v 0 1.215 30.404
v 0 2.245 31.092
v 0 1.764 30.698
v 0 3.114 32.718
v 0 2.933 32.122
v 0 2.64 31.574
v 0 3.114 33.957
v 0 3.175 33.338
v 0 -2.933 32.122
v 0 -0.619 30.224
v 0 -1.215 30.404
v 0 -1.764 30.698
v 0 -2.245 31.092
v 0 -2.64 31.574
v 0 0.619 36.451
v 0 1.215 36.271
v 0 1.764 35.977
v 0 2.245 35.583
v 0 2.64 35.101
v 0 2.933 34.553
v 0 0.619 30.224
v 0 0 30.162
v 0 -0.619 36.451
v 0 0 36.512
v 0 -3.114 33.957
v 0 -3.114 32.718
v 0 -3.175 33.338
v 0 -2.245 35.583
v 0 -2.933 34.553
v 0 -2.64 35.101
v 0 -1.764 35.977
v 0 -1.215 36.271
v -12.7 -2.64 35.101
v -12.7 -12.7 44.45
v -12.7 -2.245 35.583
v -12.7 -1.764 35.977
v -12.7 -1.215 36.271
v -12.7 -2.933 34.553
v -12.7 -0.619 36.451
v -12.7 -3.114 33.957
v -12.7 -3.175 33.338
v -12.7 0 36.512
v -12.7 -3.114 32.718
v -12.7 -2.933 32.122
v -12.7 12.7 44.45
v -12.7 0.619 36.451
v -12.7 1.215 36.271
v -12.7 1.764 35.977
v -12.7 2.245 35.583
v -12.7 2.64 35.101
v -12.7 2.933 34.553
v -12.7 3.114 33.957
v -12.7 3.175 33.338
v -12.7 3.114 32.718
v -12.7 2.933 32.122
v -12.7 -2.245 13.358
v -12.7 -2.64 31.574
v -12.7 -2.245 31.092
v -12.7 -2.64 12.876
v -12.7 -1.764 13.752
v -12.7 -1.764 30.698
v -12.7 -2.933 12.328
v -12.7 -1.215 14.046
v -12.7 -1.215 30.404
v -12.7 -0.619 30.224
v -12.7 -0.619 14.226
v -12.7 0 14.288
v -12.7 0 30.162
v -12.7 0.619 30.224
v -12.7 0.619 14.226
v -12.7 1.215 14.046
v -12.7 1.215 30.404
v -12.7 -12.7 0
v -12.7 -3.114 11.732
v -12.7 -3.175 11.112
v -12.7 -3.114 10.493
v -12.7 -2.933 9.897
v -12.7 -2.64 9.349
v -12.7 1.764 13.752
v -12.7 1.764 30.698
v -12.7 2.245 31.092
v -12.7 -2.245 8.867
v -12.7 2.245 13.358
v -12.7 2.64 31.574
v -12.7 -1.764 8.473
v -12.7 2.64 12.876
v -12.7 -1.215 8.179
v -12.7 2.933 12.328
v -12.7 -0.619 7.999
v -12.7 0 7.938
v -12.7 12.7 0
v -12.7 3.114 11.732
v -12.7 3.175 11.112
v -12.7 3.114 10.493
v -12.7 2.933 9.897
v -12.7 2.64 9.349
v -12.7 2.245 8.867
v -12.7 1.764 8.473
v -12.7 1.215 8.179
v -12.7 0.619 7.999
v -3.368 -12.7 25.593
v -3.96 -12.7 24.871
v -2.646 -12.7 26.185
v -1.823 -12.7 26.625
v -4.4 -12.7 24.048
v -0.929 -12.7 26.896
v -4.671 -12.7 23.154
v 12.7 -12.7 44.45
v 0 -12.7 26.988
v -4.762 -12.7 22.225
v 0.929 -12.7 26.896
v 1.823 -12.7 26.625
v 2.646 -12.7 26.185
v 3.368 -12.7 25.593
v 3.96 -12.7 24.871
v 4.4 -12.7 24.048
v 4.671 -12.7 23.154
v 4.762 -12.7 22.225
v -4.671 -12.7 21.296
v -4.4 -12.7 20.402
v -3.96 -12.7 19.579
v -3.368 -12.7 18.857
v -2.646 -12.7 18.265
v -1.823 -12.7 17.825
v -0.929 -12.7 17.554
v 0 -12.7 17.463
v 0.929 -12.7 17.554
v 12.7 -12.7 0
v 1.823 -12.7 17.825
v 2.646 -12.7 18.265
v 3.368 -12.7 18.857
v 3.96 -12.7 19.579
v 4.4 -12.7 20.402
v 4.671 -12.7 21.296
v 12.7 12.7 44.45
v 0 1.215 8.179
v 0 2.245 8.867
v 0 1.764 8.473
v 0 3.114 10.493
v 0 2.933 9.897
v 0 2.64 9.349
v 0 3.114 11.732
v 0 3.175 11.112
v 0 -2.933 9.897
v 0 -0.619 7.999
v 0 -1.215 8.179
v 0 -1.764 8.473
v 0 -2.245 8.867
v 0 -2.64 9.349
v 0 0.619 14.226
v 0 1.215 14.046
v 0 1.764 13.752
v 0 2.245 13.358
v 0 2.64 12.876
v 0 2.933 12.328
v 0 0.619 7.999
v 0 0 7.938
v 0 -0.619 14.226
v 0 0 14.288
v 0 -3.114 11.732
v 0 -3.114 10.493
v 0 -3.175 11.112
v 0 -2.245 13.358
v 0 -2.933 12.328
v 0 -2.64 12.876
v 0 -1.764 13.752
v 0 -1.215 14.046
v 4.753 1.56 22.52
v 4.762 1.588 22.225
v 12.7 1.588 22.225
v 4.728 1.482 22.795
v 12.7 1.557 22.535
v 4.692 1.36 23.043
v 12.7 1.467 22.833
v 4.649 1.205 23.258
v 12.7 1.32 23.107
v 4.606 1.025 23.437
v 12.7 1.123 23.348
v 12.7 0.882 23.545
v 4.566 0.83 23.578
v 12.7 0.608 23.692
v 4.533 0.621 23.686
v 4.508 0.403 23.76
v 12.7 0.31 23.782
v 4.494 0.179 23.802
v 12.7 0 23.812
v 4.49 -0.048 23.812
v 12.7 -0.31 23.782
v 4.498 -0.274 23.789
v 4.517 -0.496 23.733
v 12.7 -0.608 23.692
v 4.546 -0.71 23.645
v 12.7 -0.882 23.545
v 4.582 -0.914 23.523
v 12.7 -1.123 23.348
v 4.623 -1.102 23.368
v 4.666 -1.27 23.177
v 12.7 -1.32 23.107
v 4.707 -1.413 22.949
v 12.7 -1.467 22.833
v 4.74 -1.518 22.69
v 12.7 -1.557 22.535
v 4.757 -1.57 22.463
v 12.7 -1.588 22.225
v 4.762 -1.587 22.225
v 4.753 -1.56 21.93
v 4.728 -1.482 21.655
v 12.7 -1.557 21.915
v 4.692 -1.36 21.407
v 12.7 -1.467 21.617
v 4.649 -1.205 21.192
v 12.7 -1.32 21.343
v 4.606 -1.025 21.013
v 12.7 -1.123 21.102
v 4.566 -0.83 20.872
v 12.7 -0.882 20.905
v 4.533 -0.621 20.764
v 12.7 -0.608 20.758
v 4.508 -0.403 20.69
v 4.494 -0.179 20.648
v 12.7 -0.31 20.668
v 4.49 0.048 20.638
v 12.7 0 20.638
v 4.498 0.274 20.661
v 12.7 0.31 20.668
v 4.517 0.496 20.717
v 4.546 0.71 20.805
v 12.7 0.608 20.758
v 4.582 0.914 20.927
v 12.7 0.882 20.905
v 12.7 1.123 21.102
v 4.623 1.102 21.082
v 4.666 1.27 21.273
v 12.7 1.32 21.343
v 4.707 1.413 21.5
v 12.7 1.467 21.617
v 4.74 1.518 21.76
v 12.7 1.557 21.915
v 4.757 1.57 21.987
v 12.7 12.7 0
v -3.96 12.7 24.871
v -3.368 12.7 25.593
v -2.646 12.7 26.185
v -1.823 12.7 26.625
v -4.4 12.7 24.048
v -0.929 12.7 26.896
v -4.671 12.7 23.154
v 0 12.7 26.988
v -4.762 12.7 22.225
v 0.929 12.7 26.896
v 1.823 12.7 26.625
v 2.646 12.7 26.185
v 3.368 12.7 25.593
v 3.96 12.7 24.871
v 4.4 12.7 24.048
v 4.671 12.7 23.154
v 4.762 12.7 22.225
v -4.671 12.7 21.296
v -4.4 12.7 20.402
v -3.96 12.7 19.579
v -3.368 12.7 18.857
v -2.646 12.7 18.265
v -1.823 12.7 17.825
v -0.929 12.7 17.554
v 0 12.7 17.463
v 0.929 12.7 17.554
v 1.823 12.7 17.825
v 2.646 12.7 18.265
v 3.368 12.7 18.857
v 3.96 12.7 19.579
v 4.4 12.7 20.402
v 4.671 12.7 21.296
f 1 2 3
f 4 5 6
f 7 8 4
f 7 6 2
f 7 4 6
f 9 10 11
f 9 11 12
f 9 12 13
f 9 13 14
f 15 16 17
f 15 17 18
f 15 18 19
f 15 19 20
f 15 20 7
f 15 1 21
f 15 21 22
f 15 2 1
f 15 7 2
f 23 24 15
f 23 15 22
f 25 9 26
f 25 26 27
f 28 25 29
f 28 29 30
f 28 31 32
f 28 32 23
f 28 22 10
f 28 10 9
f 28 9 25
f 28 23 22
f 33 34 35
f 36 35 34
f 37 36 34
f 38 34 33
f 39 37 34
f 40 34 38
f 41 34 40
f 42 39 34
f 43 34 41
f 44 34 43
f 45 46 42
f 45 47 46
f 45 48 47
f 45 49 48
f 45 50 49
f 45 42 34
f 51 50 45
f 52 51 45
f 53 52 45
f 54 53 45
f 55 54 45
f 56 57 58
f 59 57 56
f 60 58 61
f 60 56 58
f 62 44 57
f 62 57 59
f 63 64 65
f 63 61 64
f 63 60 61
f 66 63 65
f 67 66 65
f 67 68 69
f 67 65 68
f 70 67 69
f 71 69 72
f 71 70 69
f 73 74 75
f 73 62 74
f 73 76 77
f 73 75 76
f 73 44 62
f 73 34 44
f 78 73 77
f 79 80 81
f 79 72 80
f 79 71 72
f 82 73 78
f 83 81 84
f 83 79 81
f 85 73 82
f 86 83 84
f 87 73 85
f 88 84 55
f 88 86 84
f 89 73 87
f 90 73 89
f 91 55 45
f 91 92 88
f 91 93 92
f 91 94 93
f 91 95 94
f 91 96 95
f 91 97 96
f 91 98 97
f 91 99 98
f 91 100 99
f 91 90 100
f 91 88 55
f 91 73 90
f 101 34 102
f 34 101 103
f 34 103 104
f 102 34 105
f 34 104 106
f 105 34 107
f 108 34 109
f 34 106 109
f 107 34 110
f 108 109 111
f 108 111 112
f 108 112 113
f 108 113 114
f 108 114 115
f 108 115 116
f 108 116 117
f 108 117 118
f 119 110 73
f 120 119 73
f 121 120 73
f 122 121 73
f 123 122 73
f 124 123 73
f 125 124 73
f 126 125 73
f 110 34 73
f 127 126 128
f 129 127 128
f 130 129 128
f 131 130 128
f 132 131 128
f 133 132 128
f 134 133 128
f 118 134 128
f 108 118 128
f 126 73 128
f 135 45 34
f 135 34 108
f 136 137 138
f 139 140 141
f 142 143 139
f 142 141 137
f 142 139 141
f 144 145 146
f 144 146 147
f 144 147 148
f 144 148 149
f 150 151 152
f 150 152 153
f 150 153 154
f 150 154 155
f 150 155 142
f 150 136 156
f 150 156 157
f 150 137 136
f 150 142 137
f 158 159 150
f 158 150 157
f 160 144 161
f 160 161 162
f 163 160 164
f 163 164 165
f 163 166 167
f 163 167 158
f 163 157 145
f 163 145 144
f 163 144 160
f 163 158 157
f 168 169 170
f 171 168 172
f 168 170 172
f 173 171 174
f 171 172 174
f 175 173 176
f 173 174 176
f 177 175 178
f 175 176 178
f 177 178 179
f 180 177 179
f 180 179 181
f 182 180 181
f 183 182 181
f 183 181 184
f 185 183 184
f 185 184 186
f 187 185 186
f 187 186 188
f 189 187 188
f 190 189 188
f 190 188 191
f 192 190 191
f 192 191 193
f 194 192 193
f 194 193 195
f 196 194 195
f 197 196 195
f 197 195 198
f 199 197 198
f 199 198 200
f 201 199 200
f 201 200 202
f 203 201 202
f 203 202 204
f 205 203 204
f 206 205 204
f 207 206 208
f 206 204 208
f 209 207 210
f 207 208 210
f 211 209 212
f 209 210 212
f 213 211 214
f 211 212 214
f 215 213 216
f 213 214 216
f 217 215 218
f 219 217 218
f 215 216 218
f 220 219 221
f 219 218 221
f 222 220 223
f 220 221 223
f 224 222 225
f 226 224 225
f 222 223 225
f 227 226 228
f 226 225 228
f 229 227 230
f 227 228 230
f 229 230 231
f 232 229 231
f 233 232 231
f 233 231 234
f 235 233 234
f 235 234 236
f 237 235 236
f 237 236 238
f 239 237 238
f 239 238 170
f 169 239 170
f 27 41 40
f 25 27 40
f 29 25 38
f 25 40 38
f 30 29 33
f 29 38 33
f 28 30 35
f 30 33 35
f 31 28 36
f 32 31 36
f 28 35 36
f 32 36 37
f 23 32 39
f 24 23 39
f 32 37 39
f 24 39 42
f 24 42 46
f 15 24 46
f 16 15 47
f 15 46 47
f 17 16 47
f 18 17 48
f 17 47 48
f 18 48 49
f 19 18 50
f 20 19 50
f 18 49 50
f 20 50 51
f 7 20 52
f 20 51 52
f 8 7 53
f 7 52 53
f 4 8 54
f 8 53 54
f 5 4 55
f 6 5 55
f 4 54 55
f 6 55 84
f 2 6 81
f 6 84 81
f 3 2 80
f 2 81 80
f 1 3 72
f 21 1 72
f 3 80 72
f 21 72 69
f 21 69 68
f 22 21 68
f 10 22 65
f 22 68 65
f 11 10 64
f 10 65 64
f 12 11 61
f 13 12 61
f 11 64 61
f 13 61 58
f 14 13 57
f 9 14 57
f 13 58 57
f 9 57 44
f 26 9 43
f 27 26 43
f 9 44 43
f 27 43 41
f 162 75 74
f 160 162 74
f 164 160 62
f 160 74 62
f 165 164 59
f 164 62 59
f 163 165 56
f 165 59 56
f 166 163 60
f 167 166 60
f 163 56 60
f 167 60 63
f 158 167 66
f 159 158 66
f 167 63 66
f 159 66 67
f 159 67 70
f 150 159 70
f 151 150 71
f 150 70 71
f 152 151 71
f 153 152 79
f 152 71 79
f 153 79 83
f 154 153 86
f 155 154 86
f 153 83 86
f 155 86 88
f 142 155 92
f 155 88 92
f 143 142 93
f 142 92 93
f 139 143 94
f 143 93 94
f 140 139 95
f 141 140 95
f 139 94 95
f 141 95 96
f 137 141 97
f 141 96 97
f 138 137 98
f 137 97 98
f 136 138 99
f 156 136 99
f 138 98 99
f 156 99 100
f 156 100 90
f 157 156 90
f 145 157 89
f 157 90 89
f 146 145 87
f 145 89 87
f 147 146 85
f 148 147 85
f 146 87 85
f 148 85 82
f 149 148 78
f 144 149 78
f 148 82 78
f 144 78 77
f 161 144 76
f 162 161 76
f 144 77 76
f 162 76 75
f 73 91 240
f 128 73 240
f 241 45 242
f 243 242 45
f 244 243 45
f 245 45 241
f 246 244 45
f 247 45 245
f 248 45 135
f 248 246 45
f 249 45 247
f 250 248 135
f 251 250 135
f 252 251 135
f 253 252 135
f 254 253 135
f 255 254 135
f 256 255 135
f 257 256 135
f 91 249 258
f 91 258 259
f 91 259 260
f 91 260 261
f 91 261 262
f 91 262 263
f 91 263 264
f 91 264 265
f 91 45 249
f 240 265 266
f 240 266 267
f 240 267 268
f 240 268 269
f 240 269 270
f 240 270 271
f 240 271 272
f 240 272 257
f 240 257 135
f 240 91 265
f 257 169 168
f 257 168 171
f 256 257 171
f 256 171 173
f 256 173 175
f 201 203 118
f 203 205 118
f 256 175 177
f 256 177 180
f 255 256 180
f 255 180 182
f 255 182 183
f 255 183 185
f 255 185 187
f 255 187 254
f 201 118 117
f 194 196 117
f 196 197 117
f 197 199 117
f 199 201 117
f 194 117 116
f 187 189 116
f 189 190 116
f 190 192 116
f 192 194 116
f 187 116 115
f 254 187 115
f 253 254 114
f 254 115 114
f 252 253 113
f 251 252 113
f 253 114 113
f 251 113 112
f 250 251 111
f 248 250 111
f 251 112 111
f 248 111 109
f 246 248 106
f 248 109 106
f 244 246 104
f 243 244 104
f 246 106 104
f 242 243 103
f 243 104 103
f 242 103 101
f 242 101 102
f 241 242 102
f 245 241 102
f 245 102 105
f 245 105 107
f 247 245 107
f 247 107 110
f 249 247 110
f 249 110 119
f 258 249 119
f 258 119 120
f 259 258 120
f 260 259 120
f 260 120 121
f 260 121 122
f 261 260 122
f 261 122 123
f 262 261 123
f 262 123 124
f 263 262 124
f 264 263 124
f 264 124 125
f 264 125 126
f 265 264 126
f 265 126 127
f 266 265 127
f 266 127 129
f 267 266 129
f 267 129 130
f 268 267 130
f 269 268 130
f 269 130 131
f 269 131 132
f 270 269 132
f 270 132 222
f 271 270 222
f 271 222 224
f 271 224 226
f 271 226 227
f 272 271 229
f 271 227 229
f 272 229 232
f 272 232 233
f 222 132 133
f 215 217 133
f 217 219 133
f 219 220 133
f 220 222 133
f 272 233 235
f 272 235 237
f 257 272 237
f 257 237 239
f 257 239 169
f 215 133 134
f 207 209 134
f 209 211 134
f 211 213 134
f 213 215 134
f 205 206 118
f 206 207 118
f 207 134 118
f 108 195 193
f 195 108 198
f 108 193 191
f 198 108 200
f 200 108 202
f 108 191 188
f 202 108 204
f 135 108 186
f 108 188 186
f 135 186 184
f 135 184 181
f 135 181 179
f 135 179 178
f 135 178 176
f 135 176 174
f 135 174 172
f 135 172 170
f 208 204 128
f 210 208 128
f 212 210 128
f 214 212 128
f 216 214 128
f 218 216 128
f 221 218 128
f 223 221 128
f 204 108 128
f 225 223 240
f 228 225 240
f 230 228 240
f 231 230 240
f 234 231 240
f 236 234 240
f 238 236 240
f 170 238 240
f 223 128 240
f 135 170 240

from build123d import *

# Parameters (mm, degrees)
F0_W     = 25.4
F0_H     = 25.4
F1_DEPTH = 44.45
F2_R     = 4.7625
F3_DEPTH = 25.401
F4_R     = 1.5875
F5_DEPTH = 12.7
F6_R     = 3.175
F7_DEPTH = 12.7


with BuildPart() as f1:
    # F0 (on Top) → F1 (new body)
    with BuildSketch(Plane.XY):
        Rectangle(F0_W, F0_H)
    extrude(amount=F1_DEPTH)

    # F2 (on face) → F3 (cut, through all)
    with BuildSketch(Plane.XZ.offset(12.7)):
        with Locations((0, 22.225)):
            Circle(F2_R)
    extrude(amount=-F3_DEPTH, mode=Mode.SUBTRACT)

    # F4 (on face) → F5 (cut)
    with BuildSketch(Plane.YZ.offset(12.7)):
        with Locations((0, 22.225)):
            Circle(F4_R)
    extrude(amount=-F5_DEPTH, mode=Mode.SUBTRACT)

    # F6 (on face) → F7 (cut)
    with BuildSketch(Plane(origin=(-12.7, 0, 0), x_dir=(0, -1, 0), z_dir=(-1, 0, 0))):
        with Locations((0, 33.3375)):
            Circle(F6_R)
        with Locations((0, 11.1125)):
            Circle(F6_R)
    extrude(amount=-F7_DEPTH, mode=Mode.SUBTRACT)


solid = f1.part
